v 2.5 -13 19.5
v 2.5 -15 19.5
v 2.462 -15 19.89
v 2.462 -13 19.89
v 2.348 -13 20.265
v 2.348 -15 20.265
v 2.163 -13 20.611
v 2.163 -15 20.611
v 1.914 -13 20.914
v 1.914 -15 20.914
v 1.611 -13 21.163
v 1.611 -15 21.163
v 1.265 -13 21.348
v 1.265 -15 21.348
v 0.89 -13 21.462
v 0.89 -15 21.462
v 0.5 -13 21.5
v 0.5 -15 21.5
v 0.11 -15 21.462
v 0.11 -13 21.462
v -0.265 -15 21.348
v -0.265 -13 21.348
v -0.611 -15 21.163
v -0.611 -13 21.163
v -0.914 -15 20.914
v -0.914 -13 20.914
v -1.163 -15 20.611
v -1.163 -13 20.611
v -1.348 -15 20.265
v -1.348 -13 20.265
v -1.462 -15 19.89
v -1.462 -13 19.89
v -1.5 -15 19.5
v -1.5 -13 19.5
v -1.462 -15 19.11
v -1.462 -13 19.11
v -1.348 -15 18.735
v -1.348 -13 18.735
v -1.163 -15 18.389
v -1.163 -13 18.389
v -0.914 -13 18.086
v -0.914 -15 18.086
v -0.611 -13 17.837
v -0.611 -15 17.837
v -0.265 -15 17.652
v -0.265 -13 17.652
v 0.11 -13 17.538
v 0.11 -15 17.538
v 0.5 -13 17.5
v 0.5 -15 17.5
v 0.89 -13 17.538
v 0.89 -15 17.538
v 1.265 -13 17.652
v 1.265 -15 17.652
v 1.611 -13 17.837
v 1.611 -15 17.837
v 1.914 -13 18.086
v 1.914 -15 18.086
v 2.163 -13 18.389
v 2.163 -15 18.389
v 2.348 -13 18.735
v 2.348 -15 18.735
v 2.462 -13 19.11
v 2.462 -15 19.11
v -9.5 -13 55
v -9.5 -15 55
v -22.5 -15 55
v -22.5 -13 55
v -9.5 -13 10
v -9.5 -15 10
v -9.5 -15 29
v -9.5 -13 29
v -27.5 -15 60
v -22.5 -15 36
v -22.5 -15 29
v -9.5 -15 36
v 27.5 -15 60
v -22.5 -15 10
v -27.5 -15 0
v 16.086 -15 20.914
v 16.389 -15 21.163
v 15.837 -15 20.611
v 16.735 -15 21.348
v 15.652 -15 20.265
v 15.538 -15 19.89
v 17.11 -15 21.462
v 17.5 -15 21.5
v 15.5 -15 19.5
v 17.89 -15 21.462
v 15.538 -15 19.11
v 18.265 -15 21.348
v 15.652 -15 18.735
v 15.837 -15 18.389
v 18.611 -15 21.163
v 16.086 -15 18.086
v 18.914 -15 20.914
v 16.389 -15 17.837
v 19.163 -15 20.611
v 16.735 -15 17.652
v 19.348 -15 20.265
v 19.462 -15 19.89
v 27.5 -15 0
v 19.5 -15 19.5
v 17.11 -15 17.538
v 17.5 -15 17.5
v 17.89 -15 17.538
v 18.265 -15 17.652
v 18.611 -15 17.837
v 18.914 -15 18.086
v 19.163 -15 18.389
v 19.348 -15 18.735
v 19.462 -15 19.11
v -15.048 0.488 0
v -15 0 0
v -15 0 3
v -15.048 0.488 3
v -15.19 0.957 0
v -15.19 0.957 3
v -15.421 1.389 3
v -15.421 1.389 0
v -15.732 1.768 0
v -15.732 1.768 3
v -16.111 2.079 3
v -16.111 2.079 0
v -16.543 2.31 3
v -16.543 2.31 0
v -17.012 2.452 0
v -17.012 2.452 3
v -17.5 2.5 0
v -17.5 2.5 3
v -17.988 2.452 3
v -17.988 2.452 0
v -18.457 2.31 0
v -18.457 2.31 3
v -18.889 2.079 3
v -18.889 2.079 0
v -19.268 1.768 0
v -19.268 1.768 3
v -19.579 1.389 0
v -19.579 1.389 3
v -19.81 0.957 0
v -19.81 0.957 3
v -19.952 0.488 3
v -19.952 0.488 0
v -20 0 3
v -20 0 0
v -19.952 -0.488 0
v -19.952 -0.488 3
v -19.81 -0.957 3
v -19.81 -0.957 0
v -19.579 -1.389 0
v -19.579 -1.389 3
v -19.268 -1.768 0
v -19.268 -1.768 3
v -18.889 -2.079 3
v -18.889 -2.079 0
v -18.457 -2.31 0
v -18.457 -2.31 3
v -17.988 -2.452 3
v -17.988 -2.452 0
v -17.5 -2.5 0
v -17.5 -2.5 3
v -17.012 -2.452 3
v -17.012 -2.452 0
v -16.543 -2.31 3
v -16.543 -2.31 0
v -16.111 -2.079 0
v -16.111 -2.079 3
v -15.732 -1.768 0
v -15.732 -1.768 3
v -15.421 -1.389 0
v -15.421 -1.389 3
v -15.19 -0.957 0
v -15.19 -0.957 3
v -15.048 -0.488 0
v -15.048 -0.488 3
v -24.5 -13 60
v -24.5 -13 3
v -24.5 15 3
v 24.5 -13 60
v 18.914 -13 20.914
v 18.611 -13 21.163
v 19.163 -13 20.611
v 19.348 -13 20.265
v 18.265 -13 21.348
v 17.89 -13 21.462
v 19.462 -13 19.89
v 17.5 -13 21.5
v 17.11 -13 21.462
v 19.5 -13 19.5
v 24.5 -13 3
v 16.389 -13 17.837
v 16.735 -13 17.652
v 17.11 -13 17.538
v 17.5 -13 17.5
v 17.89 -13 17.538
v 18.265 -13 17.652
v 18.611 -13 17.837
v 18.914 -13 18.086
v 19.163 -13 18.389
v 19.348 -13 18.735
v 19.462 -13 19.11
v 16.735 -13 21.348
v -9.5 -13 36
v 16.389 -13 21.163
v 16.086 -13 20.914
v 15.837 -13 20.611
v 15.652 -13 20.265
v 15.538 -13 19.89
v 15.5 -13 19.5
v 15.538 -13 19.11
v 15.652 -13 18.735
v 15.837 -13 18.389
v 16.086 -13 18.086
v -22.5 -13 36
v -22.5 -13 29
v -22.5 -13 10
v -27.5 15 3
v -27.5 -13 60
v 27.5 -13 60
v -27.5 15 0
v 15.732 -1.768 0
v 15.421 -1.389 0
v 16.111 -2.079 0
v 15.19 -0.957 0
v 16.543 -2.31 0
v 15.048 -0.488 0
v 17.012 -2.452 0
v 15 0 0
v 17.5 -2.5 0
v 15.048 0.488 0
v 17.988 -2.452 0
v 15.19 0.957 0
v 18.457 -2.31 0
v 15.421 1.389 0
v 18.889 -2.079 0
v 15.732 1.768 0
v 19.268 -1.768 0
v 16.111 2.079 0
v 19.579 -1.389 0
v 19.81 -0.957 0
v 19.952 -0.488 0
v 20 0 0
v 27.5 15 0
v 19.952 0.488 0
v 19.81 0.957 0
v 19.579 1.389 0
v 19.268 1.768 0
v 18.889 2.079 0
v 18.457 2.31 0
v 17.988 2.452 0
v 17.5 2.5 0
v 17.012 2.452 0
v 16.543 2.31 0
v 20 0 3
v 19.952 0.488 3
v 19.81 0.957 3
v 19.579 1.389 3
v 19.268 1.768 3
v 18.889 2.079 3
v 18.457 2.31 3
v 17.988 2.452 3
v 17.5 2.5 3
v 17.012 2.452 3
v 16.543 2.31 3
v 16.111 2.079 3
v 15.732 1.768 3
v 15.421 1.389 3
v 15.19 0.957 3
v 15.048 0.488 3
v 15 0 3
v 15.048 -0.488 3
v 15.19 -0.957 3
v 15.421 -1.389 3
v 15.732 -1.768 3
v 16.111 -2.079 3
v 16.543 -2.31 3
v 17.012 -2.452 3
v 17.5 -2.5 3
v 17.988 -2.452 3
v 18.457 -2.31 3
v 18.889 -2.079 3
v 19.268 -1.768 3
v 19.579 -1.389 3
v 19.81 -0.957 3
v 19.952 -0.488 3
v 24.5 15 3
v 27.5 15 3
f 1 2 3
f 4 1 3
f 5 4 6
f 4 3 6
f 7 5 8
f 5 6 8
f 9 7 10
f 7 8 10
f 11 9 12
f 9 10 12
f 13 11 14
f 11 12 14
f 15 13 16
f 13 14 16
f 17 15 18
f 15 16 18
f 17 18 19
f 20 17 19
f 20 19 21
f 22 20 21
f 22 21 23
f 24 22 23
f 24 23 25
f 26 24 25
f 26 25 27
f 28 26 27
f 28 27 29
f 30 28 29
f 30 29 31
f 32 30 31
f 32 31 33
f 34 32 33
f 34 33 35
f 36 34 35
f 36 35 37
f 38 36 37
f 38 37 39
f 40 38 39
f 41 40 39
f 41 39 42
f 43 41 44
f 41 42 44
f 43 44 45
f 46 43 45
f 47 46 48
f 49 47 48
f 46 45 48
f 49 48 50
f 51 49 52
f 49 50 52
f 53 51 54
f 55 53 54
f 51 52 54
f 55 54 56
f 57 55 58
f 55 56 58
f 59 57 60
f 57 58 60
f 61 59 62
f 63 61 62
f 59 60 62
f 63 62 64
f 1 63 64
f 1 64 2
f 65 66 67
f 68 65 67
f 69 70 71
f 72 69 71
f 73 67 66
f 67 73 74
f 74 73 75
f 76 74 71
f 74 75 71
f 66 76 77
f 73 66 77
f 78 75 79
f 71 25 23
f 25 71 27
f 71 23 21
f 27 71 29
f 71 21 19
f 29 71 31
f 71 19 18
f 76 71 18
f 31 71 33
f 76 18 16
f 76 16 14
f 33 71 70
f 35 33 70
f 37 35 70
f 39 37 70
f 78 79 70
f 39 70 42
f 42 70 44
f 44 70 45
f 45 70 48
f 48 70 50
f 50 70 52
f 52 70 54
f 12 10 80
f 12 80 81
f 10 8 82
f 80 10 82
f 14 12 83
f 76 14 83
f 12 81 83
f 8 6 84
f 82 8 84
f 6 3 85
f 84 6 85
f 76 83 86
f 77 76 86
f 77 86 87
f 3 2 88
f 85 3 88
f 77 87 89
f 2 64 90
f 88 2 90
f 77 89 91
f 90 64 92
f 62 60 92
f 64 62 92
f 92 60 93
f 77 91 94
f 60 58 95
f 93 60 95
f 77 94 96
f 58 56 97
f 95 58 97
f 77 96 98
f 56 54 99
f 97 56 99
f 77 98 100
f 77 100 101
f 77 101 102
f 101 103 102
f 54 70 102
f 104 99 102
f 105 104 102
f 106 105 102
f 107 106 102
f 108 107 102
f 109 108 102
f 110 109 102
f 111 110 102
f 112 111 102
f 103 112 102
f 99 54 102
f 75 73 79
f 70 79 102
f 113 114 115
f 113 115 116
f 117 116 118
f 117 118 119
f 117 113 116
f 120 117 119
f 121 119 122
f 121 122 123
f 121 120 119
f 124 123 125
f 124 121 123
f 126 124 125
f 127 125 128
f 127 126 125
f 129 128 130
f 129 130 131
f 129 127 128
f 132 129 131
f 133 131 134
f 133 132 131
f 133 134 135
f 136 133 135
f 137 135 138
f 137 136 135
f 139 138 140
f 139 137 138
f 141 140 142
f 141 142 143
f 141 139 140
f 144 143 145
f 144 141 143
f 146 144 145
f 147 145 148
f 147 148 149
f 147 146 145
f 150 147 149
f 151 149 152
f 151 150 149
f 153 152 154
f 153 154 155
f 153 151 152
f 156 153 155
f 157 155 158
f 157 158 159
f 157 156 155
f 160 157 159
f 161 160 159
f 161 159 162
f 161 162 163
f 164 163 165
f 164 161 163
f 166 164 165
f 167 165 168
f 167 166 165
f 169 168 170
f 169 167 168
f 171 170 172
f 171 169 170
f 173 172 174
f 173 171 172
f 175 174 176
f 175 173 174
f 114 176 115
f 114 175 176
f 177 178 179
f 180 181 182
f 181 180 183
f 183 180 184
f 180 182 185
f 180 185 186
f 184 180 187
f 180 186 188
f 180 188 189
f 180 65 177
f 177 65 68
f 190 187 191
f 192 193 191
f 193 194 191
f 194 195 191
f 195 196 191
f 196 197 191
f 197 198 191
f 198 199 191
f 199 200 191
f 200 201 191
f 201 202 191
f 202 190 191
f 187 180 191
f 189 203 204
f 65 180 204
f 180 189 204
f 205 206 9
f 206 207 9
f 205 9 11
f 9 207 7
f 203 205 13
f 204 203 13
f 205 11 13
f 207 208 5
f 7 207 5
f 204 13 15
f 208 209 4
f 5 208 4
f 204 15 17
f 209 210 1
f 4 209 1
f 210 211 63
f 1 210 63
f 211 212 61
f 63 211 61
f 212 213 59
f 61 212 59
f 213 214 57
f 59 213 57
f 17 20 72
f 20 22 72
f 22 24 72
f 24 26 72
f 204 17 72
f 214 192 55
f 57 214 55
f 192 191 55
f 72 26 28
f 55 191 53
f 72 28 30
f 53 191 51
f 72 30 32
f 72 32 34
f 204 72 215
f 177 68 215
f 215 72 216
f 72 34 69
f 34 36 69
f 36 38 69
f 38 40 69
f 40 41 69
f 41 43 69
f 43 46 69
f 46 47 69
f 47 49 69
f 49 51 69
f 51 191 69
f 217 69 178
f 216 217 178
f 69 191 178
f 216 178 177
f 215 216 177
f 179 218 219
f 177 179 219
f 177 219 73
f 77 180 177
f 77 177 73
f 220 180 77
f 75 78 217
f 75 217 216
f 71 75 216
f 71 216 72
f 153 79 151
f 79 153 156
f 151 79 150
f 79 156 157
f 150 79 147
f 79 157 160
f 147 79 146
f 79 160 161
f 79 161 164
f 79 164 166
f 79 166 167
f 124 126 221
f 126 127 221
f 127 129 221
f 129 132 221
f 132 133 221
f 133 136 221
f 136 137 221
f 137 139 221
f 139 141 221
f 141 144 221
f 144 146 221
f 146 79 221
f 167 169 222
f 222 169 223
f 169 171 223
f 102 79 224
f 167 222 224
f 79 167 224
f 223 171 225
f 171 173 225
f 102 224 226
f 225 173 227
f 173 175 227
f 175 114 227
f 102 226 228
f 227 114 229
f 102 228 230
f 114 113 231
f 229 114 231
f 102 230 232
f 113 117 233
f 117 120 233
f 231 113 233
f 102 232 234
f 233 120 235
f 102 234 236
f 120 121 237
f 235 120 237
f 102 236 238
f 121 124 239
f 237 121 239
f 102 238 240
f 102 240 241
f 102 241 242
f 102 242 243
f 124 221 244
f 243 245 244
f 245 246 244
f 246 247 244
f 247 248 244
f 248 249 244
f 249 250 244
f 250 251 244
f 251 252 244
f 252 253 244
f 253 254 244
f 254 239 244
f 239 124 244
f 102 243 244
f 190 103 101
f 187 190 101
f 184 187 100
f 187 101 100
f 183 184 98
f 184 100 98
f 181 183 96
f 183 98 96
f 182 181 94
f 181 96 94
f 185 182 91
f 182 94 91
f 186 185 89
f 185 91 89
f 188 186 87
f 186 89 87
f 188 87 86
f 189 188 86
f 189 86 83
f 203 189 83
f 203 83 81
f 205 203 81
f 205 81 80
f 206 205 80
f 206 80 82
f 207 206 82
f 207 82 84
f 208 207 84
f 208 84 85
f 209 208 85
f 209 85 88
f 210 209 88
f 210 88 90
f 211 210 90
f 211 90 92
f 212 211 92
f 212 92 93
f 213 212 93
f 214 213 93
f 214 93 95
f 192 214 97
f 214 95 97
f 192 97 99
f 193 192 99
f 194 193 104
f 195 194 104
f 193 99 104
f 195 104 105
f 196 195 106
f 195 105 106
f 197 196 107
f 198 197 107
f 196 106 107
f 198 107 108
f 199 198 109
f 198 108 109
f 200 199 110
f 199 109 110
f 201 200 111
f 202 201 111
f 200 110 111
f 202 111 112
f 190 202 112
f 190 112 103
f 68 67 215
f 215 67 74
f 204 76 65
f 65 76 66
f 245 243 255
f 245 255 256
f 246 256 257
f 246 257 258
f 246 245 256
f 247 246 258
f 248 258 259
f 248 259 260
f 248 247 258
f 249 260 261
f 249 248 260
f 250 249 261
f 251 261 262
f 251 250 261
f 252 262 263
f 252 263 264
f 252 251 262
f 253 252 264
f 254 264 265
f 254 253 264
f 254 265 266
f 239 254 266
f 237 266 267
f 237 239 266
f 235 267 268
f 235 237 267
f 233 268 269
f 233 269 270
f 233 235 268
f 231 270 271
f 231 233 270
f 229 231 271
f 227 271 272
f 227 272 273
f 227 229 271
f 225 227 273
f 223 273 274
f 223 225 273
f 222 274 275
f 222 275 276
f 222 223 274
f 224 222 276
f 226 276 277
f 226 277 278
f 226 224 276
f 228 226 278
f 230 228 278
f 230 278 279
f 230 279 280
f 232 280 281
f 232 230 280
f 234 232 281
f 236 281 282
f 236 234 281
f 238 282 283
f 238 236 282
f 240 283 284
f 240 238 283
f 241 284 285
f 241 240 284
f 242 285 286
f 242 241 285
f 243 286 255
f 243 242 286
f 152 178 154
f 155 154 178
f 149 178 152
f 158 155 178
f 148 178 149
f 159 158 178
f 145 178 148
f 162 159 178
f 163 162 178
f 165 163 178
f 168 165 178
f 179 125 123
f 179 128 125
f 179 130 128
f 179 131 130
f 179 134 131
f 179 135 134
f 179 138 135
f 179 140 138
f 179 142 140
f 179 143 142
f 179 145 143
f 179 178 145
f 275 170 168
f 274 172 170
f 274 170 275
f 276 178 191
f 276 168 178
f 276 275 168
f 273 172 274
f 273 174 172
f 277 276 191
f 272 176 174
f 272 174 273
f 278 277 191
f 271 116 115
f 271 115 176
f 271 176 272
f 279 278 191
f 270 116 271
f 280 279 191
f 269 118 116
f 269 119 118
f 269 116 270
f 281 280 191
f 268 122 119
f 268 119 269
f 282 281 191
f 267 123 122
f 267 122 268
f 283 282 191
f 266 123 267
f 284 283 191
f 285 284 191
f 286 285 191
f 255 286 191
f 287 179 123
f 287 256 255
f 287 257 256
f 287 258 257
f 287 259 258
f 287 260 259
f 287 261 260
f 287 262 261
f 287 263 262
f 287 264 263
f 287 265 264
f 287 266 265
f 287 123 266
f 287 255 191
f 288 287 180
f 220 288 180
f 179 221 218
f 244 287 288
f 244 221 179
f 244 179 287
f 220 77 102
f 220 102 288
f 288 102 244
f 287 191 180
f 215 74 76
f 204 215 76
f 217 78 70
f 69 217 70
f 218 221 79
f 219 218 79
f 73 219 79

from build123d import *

# Parameters (mm, degrees)
F0_W     = 49
F0_H     = 28
F0_R     = 2.5
F1_DEPTH = 3
F0_W_2   = 3
F0_H_2   = 2
F2_DEPTH = 60
F4_DEPTH = 55
F5_W     = 13
F5_H     = 19
F5_R     = 2
F6_DEPTH = 25


# Not quite as in the source:
# - a feature names something its author has since deleted; it is built from what else it names


with BuildPart() as f1:
    # F0 (on Top) → F1 (new body)
    with BuildSketch(Plane.XY):
        with Locations((0, 1)):
            Rectangle(F0_W, F0_H)
        with Locations((-17.5, 0)):
            Circle(F0_R, mode=Mode.SUBTRACT)
        with Locations((17.5, 0)):
            Circle(F0_R, mode=Mode.SUBTRACT)
    extrude(amount=F1_DEPTH)

    # F0 (on Top) → F2 (join)
    with BuildSketch(Plane.XY):
        with Locations((-26, 1)):
            Rectangle(F0_W_2, F0_H)
        with Locations((-26, -14)):
            Rectangle(F0_W_2, F0_H_2)
        with Locations((0, -14)):
            Rectangle(F0_W, F0_H_2)
        with Locations((26, -14)):
            Rectangle(F0_W_2, F0_H_2)
        with Locations((26, 1)):
            Rectangle(F0_W_2, F0_H)
    extrude(amount=F2_DEPTH)

    # F3 (on face) → F4 (cut)
    with BuildSketch(Plane(origin=(-27.5, 0, 0), x_dir=(0, -1, 0), z_dir=(-1, 0, 0))):
        Polygon((13, 60), (-15, 60), (-15, 3), align=None)
    extrude(amount=-F4_DEPTH, mode=Mode.SUBTRACT)

    # F5 (on face) → F6 (cut)
    with BuildSketch(Plane.XZ.offset(15)):
        Polygon((-22.5, 53), (-22.5, 36), (-9.5, 36), (-9.5, 55), (-22.5, 55), align=None)
        with Locations((-16, 19.5)):
            Rectangle(F5_W, F5_H)
        with Locations((0.5, 19.5)):
            Circle(F5_R)
        with Locations((17.5, 19.5)):
            Circle(F5_R)
    extrude(amount=-F6_DEPTH, mode=Mode.SUBTRACT)


solid = f1.part
